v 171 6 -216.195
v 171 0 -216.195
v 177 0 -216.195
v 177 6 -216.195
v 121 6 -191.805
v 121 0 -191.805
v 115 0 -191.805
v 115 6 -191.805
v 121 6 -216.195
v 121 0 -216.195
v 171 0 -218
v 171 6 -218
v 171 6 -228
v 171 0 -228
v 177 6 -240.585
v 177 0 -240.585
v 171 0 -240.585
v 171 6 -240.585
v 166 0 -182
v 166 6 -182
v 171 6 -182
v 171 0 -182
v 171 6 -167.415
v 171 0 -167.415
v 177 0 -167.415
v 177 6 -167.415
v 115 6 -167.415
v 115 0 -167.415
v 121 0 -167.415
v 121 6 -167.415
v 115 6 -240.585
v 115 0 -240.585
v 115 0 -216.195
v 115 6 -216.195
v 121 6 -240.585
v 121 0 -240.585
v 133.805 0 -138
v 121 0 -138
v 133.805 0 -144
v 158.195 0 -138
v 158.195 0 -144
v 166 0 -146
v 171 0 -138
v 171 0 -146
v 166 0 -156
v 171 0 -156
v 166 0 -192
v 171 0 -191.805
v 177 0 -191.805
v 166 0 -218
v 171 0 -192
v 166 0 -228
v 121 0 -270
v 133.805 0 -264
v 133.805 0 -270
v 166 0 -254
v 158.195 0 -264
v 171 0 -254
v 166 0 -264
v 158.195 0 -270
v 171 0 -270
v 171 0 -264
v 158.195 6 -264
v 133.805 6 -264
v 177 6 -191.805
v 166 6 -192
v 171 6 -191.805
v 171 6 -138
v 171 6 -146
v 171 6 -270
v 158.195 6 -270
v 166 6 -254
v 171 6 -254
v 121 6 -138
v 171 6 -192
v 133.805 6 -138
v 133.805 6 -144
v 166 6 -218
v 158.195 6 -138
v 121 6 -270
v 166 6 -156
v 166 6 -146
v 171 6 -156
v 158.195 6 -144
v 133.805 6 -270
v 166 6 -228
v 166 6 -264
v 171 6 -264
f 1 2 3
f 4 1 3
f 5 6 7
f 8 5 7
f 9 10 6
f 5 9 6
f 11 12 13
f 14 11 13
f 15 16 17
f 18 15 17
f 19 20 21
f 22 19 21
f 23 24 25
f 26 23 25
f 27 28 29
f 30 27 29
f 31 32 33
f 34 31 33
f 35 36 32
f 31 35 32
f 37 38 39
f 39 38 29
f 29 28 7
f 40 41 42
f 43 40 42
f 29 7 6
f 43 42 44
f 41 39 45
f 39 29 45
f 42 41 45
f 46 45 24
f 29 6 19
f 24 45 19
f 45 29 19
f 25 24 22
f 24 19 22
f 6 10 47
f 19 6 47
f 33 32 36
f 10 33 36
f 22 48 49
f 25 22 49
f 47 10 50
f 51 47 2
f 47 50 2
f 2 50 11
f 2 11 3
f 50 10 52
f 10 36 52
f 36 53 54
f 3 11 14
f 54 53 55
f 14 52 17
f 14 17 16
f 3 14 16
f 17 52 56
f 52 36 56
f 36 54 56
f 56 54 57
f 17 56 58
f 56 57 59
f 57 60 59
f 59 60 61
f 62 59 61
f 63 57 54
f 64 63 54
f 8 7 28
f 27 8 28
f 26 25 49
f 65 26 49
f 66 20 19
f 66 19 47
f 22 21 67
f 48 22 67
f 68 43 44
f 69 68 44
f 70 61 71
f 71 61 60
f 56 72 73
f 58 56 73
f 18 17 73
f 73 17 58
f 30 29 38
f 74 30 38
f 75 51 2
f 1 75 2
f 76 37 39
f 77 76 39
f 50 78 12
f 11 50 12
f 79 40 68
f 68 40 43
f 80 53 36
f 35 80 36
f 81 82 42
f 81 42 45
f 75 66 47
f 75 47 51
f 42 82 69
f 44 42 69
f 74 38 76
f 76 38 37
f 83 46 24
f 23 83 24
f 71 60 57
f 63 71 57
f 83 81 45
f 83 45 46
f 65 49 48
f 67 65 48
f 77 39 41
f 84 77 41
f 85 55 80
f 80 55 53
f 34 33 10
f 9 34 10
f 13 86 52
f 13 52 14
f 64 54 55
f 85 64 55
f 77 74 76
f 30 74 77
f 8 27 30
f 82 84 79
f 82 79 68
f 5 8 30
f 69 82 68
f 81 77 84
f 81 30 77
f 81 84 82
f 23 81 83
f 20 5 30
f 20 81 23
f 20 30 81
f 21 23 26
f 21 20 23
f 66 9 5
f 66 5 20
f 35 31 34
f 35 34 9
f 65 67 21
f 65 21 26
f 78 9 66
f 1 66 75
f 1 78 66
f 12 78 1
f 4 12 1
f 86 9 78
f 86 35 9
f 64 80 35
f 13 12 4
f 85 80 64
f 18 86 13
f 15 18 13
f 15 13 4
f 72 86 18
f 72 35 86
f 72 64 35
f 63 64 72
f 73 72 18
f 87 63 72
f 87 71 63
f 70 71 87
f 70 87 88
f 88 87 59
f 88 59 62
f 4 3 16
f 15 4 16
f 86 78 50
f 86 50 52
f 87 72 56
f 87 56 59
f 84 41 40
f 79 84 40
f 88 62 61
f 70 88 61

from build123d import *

# Parameters (mm, degrees)
BOSS_EXTRUDE1_DEPTH = 6
SKETCH3_W           = 5
SKETCH3_H           = 10
CUT_EXTRUDE2_DEPTH  = 10


with BuildPart() as part:
    # Sketch2 → Boss-Extrude1 (new body)
    with BuildSketch(Plane(origin=(0, 0, 0), x_dir=(1, 0, 0), z_dir=(0, 1, 0))):
        Polygon((121, 270), (121, 240.585), (115, 240.585), (115, 216.195), (121, 216.195), (121, 191.805), (115, 191.805), (115, 167.415), (121, 167.415), (121, 143.025), (121, 138), (133.805, 138), (133.805, 144), (158.195, 144), (158.195, 138), (171, 138), (171, 167.415), (177, 167.415), (177, 191.805), (171, 191.805), (171, 216.195), (177, 216.195), (177, 240.585), (171, 240.585), (171, 264.975), (171, 270), (158.195, 270), (158.195, 264), (133.805, 264), (133.805, 270), align=None)
    extrude(amount=BOSS_EXTRUDE1_DEPTH)

    # Sketch3 → Cut-Extrude2 (cut)
    with BuildSketch(Plane(origin=(0, 6, 0), x_dir=(1, 0, 0), z_dir=(0, 1, 0))):
        with Locations((168.5, 259)):
            Rectangle(SKETCH3_W, SKETCH3_H)
        with Locations((168.5, 223)):
            Rectangle(SKETCH3_W, SKETCH3_H)
        with Locations((168.5, 187)):
            Rectangle(SKETCH3_W, SKETCH3_H)
        with Locations((168.5, 151)):
            Rectangle(SKETCH3_W, SKETCH3_H)
    extrude(amount=-CUT_EXTRUDE2_DEPTH, mode=Mode.SUBTRACT)


solid = part.part
